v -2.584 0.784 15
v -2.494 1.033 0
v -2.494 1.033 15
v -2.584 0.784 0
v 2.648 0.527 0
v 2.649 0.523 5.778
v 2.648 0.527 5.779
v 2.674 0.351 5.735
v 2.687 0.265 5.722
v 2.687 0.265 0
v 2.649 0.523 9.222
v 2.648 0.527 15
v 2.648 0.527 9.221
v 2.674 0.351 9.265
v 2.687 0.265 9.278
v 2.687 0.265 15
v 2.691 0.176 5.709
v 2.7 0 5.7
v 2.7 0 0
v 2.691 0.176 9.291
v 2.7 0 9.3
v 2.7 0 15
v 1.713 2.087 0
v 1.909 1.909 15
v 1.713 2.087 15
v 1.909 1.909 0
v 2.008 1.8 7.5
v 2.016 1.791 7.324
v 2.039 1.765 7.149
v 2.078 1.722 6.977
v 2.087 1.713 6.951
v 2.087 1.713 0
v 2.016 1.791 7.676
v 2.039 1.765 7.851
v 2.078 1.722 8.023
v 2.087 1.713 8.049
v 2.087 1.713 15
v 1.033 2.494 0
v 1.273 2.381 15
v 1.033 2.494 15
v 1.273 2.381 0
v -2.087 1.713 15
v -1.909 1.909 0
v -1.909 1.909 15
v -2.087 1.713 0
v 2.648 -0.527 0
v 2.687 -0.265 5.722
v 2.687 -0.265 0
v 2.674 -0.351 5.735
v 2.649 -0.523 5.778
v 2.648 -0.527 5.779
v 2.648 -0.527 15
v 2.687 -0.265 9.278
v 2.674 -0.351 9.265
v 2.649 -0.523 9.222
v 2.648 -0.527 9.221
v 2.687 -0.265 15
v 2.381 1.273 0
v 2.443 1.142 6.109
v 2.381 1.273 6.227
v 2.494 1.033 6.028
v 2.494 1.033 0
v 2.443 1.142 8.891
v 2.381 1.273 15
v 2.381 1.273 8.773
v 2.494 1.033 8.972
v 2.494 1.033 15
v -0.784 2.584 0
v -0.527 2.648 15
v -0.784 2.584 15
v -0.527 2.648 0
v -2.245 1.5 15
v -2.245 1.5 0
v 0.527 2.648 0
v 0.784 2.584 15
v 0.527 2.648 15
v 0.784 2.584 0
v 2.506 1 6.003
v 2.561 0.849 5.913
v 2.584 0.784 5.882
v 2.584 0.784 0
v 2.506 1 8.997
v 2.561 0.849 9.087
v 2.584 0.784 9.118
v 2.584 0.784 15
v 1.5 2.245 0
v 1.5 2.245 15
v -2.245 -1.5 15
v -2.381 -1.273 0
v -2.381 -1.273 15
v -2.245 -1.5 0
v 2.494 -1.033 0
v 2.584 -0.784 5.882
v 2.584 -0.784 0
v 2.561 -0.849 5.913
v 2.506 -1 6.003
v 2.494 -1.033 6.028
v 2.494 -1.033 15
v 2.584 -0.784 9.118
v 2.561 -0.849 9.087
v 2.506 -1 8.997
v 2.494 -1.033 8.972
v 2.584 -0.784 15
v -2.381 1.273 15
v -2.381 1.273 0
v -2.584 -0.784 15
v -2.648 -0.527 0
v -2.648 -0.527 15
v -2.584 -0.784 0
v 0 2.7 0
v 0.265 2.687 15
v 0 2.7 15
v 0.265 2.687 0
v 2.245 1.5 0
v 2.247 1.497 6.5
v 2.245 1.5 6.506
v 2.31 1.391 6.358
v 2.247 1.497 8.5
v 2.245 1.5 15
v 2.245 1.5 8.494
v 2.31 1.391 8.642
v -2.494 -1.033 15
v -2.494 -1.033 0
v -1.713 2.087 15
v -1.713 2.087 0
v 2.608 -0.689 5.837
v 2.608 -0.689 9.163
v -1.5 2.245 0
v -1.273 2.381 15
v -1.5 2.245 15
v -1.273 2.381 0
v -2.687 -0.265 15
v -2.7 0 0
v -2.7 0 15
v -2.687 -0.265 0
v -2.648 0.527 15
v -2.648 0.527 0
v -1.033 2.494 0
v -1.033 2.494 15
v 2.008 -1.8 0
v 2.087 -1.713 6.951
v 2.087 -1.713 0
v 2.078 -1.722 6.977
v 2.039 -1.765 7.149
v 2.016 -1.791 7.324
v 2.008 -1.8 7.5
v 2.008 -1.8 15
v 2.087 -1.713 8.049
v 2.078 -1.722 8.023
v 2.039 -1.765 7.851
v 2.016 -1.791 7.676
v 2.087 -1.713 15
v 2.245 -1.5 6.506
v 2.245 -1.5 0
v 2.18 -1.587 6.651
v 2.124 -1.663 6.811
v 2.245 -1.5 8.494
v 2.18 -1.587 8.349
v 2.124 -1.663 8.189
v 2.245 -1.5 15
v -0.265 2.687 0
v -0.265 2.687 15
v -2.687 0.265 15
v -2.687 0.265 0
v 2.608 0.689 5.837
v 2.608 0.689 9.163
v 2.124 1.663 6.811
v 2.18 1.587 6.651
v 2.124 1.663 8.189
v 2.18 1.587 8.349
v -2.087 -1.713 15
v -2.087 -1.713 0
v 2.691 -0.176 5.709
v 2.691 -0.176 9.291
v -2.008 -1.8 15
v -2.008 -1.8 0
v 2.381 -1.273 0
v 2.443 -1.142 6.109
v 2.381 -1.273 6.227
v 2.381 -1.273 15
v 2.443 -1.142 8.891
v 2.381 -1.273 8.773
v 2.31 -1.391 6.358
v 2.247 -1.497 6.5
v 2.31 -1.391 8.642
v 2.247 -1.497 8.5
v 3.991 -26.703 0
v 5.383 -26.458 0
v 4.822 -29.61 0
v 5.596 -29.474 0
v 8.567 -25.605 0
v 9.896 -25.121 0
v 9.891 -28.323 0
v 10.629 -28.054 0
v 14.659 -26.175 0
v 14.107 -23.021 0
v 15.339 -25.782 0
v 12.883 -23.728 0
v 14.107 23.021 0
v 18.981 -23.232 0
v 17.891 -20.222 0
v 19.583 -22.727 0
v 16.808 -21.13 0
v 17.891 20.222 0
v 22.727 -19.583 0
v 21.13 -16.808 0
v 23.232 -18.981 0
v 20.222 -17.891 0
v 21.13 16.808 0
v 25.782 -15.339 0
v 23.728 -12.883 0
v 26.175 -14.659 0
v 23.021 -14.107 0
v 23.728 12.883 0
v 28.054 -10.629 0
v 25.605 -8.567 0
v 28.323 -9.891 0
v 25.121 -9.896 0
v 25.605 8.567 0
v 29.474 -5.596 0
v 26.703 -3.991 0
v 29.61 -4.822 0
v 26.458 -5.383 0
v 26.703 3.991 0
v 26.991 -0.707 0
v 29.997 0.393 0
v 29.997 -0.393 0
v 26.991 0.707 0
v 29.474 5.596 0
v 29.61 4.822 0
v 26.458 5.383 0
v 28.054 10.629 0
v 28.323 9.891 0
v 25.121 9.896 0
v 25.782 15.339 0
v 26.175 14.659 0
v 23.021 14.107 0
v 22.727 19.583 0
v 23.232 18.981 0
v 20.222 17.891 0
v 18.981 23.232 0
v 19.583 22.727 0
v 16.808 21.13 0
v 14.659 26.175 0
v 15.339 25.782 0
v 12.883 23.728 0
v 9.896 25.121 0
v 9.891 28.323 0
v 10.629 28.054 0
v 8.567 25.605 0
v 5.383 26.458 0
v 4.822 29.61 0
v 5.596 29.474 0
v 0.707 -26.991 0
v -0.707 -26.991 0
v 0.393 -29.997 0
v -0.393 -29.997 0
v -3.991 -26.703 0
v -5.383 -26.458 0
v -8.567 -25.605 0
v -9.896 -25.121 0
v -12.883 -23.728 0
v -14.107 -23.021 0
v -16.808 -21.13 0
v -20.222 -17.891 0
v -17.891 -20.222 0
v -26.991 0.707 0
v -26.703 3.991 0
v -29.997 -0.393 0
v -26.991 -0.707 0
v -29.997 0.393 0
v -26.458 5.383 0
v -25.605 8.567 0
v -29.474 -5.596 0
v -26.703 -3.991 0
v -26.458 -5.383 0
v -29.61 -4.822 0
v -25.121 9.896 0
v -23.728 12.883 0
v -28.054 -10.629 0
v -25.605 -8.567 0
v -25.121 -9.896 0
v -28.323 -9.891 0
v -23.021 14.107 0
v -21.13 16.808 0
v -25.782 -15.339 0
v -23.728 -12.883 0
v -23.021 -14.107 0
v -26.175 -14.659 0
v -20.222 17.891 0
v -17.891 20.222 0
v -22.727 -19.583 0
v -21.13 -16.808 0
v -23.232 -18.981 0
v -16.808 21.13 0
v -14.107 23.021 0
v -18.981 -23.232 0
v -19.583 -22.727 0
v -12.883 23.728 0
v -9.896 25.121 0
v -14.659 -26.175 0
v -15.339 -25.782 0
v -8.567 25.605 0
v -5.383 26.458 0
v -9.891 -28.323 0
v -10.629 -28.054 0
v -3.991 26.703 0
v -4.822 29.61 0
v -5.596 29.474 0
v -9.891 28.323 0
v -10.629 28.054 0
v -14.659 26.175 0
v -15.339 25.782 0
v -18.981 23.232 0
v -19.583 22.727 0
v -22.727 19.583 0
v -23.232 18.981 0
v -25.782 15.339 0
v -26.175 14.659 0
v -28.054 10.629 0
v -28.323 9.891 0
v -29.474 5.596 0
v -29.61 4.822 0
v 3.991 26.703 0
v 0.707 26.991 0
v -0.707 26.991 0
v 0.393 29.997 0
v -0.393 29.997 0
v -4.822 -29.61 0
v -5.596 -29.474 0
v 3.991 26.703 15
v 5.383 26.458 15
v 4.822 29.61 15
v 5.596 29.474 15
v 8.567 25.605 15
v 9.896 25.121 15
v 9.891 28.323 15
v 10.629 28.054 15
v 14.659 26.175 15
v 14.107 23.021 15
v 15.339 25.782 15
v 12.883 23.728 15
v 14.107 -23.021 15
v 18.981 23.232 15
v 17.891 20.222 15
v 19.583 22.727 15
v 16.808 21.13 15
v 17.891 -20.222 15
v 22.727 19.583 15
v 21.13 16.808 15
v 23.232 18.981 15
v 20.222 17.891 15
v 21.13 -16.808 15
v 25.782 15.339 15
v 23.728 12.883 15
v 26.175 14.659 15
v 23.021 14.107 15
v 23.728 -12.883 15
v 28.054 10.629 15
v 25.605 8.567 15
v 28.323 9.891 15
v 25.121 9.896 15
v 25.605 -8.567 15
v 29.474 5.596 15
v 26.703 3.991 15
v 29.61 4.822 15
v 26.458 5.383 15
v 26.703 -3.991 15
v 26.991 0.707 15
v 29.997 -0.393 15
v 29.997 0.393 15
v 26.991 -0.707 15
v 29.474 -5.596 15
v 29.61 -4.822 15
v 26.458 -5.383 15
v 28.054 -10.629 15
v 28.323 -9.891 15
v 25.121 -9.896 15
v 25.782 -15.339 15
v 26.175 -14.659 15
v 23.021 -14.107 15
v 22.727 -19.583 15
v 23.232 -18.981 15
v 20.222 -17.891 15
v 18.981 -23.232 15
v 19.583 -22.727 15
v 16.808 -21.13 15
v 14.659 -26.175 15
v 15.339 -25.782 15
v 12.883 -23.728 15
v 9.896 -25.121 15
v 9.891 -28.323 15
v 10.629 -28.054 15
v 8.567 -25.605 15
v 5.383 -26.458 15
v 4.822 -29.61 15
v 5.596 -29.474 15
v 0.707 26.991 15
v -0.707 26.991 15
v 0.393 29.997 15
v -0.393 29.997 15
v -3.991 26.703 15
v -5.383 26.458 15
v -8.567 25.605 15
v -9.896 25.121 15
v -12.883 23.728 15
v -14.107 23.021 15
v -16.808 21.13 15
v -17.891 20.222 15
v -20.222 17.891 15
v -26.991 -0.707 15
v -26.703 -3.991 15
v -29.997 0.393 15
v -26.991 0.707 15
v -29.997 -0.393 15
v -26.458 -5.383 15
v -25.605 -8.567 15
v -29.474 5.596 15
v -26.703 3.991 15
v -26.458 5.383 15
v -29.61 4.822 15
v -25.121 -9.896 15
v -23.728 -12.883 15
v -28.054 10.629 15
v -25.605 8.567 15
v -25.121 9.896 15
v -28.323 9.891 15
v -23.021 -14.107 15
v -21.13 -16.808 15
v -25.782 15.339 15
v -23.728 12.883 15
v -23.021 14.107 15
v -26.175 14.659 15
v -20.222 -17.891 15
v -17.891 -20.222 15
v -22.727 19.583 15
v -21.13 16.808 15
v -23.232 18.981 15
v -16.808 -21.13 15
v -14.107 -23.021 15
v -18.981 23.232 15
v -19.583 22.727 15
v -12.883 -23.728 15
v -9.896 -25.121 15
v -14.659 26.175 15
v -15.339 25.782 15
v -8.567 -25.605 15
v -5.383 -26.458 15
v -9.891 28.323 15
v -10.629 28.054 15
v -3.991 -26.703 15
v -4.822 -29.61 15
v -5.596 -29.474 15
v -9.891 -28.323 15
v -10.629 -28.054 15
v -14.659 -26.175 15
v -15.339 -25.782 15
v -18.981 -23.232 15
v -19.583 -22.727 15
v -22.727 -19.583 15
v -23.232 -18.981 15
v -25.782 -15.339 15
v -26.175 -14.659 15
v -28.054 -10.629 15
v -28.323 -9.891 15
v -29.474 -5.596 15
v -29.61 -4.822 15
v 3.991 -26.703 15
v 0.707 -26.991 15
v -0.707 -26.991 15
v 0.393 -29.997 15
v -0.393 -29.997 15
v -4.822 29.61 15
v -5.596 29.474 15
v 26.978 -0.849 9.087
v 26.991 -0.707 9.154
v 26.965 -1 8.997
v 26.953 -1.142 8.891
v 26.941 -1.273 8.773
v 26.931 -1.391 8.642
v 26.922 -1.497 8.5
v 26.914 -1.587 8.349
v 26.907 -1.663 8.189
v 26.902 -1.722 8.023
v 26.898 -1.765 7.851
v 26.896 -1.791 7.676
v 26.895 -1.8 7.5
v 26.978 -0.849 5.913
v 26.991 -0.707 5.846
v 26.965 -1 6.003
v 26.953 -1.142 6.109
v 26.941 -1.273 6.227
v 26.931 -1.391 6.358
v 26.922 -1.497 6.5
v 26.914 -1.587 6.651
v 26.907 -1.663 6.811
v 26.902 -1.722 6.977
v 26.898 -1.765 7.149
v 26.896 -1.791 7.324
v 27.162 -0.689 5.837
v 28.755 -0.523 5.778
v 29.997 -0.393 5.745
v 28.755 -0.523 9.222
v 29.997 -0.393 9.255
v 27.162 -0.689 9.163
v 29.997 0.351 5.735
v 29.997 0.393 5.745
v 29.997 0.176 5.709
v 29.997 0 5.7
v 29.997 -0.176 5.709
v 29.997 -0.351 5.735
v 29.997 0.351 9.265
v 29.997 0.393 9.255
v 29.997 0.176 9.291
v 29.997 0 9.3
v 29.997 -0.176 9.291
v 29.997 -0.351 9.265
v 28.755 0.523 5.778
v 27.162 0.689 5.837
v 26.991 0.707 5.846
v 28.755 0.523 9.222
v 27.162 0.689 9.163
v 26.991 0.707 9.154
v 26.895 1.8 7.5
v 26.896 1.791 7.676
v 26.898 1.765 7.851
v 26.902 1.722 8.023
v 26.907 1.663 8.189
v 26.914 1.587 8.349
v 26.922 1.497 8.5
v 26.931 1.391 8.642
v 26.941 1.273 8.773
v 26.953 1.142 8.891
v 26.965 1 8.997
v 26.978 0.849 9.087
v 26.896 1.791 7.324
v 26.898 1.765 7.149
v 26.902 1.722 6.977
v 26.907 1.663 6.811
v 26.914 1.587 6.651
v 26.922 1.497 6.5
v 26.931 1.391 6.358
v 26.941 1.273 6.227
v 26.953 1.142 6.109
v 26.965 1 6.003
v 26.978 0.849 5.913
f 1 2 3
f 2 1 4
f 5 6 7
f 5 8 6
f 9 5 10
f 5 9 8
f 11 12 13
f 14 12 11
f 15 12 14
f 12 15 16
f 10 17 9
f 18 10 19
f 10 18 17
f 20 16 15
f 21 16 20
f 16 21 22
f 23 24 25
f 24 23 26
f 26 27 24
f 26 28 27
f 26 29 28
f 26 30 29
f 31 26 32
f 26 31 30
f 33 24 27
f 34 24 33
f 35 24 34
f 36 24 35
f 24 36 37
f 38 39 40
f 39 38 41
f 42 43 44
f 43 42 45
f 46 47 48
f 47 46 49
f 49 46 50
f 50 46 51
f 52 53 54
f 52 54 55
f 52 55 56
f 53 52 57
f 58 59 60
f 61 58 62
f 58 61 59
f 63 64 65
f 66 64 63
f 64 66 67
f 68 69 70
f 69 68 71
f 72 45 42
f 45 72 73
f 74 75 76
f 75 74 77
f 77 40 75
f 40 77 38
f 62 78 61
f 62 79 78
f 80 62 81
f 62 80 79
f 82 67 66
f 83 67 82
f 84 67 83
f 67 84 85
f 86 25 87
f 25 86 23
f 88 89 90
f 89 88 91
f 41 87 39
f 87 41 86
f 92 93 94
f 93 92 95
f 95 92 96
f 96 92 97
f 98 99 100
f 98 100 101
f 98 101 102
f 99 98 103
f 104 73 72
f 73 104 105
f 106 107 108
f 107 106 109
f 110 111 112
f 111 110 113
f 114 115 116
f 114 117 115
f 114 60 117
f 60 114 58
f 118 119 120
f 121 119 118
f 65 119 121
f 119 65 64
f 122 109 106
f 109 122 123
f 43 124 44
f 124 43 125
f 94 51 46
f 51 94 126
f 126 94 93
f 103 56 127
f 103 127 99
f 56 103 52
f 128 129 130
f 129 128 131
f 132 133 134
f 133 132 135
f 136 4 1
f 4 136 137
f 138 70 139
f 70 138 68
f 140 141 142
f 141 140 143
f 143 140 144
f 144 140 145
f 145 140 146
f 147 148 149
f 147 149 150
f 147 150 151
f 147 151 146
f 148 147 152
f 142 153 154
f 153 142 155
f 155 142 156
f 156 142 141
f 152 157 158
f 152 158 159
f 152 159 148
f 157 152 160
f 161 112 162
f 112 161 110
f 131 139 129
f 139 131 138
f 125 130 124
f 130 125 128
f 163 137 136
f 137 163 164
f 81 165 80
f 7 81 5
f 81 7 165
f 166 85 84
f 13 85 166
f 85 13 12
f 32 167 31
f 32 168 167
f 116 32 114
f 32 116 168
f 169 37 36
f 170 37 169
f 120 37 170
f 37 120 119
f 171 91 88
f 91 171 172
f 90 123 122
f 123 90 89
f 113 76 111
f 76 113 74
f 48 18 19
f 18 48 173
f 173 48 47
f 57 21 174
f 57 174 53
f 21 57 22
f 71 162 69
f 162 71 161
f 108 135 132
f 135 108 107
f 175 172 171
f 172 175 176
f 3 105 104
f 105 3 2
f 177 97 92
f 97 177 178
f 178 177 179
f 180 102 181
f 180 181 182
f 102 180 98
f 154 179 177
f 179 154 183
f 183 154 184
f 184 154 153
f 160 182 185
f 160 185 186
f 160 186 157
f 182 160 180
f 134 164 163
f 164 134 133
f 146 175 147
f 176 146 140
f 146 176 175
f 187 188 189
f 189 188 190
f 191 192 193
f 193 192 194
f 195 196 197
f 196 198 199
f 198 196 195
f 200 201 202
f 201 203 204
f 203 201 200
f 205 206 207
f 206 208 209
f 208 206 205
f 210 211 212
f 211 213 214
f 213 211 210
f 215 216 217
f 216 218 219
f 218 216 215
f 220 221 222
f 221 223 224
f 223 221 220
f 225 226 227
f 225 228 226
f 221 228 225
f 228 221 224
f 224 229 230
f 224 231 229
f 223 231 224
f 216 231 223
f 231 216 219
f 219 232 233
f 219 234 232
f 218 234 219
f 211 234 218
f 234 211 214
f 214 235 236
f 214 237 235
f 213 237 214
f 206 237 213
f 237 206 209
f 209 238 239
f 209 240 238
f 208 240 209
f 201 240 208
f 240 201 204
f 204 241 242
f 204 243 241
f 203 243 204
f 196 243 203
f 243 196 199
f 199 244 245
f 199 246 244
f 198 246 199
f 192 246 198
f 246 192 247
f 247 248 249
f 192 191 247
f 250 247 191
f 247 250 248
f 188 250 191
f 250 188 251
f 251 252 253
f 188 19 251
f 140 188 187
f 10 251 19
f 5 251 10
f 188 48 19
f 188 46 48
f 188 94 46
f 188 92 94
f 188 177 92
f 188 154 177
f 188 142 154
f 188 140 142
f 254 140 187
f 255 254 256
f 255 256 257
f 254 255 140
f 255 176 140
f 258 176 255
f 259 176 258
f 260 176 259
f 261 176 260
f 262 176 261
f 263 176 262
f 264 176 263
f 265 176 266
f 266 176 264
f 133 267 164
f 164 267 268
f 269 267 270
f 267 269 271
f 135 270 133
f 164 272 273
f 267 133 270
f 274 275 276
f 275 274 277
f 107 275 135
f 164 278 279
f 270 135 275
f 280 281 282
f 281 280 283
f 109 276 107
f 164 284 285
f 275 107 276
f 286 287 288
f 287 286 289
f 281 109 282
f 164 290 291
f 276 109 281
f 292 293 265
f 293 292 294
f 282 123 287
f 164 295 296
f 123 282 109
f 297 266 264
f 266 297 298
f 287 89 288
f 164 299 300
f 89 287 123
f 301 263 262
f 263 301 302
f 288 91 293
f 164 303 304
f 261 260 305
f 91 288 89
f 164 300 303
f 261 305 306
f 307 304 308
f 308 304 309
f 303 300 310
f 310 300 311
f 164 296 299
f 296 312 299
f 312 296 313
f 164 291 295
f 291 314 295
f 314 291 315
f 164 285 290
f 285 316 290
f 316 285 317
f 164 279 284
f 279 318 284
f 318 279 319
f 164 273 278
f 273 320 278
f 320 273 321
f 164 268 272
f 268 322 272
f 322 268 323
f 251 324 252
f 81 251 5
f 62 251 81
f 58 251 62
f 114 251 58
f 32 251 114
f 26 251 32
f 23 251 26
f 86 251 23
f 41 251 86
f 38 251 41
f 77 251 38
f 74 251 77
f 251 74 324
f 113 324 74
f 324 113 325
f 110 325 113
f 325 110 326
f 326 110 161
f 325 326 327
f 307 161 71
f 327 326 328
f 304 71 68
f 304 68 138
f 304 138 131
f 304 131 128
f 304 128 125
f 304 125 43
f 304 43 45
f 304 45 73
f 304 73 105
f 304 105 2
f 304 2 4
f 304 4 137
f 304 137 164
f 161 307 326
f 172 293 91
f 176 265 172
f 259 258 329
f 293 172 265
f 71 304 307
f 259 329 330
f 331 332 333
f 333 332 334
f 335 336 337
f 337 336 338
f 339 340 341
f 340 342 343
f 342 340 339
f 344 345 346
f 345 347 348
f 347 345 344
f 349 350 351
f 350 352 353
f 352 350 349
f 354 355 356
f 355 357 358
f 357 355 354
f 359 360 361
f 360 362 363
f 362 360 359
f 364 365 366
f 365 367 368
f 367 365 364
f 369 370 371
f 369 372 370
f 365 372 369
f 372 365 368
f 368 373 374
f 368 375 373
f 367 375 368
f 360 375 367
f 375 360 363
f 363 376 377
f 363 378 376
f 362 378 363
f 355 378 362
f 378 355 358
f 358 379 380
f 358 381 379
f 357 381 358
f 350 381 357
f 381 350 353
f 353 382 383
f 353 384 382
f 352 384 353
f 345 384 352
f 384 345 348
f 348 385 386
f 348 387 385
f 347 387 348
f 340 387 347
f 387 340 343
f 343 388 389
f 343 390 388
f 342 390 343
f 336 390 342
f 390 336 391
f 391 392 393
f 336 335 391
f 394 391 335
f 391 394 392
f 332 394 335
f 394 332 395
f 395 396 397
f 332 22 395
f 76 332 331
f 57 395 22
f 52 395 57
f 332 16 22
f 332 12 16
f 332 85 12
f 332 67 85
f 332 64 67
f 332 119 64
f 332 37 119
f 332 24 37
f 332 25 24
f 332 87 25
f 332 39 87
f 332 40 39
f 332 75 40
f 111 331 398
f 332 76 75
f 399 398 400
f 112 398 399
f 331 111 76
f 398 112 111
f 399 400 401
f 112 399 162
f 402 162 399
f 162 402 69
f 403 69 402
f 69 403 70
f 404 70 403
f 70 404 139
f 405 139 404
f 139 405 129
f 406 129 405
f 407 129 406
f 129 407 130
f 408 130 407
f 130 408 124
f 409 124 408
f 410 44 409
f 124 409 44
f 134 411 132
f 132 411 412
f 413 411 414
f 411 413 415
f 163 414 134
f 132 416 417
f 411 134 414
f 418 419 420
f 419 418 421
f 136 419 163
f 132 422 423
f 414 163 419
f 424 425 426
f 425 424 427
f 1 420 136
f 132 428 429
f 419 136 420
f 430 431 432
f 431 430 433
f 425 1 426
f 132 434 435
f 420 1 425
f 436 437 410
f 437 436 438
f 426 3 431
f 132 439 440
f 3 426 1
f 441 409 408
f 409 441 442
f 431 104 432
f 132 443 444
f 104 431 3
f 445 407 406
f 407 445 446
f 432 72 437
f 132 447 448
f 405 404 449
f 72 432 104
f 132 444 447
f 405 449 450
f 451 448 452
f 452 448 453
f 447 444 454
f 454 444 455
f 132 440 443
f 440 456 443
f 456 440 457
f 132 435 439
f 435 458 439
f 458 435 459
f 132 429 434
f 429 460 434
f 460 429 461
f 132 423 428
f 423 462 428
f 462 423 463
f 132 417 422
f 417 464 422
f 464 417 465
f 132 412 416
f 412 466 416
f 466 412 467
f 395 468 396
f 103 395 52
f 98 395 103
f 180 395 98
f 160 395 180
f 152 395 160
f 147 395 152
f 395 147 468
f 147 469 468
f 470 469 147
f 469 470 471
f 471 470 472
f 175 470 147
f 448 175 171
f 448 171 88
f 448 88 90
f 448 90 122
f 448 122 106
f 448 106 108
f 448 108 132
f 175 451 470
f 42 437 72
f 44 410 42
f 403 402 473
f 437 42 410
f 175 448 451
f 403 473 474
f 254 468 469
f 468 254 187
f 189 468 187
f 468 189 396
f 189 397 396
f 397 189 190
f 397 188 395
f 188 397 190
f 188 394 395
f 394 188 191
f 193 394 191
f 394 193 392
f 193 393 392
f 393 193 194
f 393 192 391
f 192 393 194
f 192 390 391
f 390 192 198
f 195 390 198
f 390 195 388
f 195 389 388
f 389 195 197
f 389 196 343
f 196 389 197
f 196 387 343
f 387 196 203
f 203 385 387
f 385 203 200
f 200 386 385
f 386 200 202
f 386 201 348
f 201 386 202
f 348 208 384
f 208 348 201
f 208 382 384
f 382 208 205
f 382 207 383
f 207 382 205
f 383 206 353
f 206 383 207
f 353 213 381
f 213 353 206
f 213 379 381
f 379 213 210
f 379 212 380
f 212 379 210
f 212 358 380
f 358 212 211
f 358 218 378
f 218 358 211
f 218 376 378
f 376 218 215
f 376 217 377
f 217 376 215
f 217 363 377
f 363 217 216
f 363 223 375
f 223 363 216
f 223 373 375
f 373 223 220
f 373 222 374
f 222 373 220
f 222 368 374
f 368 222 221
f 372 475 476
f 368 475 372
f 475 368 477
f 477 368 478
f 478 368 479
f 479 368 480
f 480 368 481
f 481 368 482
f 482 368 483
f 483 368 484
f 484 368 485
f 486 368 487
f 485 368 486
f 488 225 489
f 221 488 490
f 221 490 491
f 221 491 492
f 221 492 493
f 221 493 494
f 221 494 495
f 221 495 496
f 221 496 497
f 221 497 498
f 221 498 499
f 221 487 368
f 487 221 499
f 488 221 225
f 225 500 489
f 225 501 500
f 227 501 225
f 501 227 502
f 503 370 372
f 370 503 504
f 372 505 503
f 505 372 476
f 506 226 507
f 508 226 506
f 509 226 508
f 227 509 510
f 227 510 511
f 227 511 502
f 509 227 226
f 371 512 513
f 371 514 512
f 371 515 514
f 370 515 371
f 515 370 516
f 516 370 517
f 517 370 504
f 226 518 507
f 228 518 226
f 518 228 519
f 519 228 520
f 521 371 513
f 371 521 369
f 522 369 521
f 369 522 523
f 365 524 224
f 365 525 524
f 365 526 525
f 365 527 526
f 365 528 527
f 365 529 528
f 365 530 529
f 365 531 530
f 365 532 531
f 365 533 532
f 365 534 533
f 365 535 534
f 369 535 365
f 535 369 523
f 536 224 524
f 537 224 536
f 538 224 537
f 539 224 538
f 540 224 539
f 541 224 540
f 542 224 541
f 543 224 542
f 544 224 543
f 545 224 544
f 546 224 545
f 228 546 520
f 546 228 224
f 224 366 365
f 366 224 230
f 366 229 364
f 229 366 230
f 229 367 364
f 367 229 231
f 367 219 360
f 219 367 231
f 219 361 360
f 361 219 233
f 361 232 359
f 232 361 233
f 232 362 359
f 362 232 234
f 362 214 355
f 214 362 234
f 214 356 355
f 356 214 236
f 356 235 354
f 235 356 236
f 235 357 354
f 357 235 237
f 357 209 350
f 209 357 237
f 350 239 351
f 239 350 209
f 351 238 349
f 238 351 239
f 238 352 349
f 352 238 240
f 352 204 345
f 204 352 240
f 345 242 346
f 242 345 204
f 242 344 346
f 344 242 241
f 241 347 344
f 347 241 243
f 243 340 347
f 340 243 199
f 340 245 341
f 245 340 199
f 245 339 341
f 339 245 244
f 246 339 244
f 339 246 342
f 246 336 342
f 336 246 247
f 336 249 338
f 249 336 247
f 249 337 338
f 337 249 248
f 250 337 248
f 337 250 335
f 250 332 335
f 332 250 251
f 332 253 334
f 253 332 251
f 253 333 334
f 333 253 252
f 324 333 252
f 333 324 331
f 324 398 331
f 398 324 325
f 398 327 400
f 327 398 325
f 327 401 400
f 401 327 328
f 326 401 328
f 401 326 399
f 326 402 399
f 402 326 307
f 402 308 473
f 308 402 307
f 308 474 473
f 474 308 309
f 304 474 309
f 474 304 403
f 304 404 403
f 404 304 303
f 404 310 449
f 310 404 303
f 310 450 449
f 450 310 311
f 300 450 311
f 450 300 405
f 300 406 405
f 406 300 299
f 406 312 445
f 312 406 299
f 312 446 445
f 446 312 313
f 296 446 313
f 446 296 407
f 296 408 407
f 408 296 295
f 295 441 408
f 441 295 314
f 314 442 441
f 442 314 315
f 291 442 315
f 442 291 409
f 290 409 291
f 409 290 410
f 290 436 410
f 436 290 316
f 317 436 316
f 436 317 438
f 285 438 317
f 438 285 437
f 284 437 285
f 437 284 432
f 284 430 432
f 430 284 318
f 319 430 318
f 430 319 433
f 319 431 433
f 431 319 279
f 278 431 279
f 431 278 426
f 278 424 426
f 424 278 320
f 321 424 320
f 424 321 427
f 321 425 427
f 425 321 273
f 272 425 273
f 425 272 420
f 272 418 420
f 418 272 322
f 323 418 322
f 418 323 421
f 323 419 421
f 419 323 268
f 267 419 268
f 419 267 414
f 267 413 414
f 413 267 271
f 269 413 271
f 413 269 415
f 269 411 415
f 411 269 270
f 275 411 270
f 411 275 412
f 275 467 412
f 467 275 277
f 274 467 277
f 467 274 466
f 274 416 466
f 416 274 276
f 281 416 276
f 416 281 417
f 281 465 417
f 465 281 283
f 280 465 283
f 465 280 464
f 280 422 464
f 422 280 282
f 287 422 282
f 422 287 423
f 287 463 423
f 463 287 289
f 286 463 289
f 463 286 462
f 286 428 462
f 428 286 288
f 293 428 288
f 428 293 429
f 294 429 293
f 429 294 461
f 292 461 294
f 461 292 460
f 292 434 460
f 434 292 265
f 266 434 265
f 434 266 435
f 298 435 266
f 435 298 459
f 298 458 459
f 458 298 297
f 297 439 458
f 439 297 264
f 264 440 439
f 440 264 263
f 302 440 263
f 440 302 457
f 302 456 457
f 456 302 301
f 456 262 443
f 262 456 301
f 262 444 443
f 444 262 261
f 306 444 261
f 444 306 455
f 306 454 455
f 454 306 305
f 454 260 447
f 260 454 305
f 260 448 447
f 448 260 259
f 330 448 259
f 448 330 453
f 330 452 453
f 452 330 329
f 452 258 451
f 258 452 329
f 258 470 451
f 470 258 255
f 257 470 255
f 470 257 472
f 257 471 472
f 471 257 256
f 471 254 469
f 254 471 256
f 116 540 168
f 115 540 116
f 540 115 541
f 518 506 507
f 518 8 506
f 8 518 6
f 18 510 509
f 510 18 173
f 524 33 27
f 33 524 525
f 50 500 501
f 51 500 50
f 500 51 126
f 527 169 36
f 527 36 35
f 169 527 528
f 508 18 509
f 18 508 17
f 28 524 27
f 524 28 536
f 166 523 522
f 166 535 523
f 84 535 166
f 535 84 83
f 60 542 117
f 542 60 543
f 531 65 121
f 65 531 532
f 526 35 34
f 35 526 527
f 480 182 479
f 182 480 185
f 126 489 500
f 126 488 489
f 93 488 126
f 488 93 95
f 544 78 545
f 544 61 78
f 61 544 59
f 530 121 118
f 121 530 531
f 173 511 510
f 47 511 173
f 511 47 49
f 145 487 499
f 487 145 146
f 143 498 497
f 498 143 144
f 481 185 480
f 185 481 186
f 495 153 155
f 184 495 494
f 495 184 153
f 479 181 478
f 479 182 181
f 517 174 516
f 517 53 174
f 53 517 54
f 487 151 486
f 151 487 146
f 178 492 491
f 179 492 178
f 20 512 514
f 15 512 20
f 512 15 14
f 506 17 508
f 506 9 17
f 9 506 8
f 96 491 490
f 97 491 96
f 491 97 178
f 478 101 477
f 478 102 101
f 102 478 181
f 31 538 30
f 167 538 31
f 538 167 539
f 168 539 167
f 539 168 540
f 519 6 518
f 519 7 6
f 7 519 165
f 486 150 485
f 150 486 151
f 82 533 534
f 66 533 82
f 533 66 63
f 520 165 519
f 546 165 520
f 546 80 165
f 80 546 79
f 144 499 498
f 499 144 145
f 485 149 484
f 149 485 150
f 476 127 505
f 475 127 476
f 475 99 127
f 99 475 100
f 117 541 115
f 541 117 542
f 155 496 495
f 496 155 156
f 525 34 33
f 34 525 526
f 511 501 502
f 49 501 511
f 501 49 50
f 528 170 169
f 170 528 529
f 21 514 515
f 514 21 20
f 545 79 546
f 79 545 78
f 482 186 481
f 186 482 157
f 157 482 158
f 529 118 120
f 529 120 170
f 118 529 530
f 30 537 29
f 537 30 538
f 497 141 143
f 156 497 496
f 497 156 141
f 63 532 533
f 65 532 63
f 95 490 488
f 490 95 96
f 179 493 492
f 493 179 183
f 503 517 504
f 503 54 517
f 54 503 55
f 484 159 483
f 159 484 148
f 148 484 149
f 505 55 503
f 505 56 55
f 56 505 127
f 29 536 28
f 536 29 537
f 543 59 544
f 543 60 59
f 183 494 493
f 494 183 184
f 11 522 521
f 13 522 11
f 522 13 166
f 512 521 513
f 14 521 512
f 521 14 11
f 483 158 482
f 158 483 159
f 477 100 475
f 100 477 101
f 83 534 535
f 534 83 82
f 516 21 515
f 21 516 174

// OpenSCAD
// STANDALONE DRIVE GEAR 
// CALIBRATED FOR: NEMA 17 (17HE19-2004S) 
// TOLERANCE: +0.3mm for uncalibrated printers

$fn = 64;

// --- PARAMETERS ---
// dia: 5mm shaft + 0.3mm error + 0.1mm fit = 5.4mm
// d_offset: Calculated for 4.5mm flat thickness (5.4 - 4.5 = 0.9)
drive_gear(dia = 5.4, is_d = true, d_offset = 0.9);

module drive_gear(dia, is_d, d_offset) {
    difference() {
        // Gear Body
        linear_extrude(height = 15) gear_profile(36, 30, 27);
        
        // Internal Shaft Hole (D-cut)
        translate([0,0,-1]) {
            if(is_d) intersection() {
                cylinder(h=17, d=dia);
                // The D-cut creates the 4.5mm flat needed for the motor shaft
                translate([-dia/2, -dia/2 + d_offset, 0]) cube([dia, dia, 17]);
            } else {
                cylinder(h=17, d=dia);
            }
        }
        
        // Grub Screw Hole (Enlarged to 3.6mm for M3 screw fit)
        translate([0, 0, 7.5]) rotate([0, 90, 0]) cylinder(h=30, d=3.6);
    }
}

module gear_profile(teeth, r_out, r_in, flat=0.6) {
    angle_step = 360/teeth;
    points = [for (i = [0:teeth-1]) each [
        [r_in*cos(i*angle_step-angle_step*flat/4), r_in*sin(i*angle_step-angle_step*flat/4)],
        [r_out*cos(i*angle_step-angle_step*flat/8), r_out*sin(i*angle_step-angle_step*flat/8)],
        [r_out*cos(i*angle_step+angle_step*flat/8), r_out*sin(i*angle_step+angle_step*flat/8)],
        [r_in*cos(i*angle_step+angle_step*flat/4), r_in*sin(i*angle_step+angle_step*flat/4)]
    ]];
    polygon(points);
}
